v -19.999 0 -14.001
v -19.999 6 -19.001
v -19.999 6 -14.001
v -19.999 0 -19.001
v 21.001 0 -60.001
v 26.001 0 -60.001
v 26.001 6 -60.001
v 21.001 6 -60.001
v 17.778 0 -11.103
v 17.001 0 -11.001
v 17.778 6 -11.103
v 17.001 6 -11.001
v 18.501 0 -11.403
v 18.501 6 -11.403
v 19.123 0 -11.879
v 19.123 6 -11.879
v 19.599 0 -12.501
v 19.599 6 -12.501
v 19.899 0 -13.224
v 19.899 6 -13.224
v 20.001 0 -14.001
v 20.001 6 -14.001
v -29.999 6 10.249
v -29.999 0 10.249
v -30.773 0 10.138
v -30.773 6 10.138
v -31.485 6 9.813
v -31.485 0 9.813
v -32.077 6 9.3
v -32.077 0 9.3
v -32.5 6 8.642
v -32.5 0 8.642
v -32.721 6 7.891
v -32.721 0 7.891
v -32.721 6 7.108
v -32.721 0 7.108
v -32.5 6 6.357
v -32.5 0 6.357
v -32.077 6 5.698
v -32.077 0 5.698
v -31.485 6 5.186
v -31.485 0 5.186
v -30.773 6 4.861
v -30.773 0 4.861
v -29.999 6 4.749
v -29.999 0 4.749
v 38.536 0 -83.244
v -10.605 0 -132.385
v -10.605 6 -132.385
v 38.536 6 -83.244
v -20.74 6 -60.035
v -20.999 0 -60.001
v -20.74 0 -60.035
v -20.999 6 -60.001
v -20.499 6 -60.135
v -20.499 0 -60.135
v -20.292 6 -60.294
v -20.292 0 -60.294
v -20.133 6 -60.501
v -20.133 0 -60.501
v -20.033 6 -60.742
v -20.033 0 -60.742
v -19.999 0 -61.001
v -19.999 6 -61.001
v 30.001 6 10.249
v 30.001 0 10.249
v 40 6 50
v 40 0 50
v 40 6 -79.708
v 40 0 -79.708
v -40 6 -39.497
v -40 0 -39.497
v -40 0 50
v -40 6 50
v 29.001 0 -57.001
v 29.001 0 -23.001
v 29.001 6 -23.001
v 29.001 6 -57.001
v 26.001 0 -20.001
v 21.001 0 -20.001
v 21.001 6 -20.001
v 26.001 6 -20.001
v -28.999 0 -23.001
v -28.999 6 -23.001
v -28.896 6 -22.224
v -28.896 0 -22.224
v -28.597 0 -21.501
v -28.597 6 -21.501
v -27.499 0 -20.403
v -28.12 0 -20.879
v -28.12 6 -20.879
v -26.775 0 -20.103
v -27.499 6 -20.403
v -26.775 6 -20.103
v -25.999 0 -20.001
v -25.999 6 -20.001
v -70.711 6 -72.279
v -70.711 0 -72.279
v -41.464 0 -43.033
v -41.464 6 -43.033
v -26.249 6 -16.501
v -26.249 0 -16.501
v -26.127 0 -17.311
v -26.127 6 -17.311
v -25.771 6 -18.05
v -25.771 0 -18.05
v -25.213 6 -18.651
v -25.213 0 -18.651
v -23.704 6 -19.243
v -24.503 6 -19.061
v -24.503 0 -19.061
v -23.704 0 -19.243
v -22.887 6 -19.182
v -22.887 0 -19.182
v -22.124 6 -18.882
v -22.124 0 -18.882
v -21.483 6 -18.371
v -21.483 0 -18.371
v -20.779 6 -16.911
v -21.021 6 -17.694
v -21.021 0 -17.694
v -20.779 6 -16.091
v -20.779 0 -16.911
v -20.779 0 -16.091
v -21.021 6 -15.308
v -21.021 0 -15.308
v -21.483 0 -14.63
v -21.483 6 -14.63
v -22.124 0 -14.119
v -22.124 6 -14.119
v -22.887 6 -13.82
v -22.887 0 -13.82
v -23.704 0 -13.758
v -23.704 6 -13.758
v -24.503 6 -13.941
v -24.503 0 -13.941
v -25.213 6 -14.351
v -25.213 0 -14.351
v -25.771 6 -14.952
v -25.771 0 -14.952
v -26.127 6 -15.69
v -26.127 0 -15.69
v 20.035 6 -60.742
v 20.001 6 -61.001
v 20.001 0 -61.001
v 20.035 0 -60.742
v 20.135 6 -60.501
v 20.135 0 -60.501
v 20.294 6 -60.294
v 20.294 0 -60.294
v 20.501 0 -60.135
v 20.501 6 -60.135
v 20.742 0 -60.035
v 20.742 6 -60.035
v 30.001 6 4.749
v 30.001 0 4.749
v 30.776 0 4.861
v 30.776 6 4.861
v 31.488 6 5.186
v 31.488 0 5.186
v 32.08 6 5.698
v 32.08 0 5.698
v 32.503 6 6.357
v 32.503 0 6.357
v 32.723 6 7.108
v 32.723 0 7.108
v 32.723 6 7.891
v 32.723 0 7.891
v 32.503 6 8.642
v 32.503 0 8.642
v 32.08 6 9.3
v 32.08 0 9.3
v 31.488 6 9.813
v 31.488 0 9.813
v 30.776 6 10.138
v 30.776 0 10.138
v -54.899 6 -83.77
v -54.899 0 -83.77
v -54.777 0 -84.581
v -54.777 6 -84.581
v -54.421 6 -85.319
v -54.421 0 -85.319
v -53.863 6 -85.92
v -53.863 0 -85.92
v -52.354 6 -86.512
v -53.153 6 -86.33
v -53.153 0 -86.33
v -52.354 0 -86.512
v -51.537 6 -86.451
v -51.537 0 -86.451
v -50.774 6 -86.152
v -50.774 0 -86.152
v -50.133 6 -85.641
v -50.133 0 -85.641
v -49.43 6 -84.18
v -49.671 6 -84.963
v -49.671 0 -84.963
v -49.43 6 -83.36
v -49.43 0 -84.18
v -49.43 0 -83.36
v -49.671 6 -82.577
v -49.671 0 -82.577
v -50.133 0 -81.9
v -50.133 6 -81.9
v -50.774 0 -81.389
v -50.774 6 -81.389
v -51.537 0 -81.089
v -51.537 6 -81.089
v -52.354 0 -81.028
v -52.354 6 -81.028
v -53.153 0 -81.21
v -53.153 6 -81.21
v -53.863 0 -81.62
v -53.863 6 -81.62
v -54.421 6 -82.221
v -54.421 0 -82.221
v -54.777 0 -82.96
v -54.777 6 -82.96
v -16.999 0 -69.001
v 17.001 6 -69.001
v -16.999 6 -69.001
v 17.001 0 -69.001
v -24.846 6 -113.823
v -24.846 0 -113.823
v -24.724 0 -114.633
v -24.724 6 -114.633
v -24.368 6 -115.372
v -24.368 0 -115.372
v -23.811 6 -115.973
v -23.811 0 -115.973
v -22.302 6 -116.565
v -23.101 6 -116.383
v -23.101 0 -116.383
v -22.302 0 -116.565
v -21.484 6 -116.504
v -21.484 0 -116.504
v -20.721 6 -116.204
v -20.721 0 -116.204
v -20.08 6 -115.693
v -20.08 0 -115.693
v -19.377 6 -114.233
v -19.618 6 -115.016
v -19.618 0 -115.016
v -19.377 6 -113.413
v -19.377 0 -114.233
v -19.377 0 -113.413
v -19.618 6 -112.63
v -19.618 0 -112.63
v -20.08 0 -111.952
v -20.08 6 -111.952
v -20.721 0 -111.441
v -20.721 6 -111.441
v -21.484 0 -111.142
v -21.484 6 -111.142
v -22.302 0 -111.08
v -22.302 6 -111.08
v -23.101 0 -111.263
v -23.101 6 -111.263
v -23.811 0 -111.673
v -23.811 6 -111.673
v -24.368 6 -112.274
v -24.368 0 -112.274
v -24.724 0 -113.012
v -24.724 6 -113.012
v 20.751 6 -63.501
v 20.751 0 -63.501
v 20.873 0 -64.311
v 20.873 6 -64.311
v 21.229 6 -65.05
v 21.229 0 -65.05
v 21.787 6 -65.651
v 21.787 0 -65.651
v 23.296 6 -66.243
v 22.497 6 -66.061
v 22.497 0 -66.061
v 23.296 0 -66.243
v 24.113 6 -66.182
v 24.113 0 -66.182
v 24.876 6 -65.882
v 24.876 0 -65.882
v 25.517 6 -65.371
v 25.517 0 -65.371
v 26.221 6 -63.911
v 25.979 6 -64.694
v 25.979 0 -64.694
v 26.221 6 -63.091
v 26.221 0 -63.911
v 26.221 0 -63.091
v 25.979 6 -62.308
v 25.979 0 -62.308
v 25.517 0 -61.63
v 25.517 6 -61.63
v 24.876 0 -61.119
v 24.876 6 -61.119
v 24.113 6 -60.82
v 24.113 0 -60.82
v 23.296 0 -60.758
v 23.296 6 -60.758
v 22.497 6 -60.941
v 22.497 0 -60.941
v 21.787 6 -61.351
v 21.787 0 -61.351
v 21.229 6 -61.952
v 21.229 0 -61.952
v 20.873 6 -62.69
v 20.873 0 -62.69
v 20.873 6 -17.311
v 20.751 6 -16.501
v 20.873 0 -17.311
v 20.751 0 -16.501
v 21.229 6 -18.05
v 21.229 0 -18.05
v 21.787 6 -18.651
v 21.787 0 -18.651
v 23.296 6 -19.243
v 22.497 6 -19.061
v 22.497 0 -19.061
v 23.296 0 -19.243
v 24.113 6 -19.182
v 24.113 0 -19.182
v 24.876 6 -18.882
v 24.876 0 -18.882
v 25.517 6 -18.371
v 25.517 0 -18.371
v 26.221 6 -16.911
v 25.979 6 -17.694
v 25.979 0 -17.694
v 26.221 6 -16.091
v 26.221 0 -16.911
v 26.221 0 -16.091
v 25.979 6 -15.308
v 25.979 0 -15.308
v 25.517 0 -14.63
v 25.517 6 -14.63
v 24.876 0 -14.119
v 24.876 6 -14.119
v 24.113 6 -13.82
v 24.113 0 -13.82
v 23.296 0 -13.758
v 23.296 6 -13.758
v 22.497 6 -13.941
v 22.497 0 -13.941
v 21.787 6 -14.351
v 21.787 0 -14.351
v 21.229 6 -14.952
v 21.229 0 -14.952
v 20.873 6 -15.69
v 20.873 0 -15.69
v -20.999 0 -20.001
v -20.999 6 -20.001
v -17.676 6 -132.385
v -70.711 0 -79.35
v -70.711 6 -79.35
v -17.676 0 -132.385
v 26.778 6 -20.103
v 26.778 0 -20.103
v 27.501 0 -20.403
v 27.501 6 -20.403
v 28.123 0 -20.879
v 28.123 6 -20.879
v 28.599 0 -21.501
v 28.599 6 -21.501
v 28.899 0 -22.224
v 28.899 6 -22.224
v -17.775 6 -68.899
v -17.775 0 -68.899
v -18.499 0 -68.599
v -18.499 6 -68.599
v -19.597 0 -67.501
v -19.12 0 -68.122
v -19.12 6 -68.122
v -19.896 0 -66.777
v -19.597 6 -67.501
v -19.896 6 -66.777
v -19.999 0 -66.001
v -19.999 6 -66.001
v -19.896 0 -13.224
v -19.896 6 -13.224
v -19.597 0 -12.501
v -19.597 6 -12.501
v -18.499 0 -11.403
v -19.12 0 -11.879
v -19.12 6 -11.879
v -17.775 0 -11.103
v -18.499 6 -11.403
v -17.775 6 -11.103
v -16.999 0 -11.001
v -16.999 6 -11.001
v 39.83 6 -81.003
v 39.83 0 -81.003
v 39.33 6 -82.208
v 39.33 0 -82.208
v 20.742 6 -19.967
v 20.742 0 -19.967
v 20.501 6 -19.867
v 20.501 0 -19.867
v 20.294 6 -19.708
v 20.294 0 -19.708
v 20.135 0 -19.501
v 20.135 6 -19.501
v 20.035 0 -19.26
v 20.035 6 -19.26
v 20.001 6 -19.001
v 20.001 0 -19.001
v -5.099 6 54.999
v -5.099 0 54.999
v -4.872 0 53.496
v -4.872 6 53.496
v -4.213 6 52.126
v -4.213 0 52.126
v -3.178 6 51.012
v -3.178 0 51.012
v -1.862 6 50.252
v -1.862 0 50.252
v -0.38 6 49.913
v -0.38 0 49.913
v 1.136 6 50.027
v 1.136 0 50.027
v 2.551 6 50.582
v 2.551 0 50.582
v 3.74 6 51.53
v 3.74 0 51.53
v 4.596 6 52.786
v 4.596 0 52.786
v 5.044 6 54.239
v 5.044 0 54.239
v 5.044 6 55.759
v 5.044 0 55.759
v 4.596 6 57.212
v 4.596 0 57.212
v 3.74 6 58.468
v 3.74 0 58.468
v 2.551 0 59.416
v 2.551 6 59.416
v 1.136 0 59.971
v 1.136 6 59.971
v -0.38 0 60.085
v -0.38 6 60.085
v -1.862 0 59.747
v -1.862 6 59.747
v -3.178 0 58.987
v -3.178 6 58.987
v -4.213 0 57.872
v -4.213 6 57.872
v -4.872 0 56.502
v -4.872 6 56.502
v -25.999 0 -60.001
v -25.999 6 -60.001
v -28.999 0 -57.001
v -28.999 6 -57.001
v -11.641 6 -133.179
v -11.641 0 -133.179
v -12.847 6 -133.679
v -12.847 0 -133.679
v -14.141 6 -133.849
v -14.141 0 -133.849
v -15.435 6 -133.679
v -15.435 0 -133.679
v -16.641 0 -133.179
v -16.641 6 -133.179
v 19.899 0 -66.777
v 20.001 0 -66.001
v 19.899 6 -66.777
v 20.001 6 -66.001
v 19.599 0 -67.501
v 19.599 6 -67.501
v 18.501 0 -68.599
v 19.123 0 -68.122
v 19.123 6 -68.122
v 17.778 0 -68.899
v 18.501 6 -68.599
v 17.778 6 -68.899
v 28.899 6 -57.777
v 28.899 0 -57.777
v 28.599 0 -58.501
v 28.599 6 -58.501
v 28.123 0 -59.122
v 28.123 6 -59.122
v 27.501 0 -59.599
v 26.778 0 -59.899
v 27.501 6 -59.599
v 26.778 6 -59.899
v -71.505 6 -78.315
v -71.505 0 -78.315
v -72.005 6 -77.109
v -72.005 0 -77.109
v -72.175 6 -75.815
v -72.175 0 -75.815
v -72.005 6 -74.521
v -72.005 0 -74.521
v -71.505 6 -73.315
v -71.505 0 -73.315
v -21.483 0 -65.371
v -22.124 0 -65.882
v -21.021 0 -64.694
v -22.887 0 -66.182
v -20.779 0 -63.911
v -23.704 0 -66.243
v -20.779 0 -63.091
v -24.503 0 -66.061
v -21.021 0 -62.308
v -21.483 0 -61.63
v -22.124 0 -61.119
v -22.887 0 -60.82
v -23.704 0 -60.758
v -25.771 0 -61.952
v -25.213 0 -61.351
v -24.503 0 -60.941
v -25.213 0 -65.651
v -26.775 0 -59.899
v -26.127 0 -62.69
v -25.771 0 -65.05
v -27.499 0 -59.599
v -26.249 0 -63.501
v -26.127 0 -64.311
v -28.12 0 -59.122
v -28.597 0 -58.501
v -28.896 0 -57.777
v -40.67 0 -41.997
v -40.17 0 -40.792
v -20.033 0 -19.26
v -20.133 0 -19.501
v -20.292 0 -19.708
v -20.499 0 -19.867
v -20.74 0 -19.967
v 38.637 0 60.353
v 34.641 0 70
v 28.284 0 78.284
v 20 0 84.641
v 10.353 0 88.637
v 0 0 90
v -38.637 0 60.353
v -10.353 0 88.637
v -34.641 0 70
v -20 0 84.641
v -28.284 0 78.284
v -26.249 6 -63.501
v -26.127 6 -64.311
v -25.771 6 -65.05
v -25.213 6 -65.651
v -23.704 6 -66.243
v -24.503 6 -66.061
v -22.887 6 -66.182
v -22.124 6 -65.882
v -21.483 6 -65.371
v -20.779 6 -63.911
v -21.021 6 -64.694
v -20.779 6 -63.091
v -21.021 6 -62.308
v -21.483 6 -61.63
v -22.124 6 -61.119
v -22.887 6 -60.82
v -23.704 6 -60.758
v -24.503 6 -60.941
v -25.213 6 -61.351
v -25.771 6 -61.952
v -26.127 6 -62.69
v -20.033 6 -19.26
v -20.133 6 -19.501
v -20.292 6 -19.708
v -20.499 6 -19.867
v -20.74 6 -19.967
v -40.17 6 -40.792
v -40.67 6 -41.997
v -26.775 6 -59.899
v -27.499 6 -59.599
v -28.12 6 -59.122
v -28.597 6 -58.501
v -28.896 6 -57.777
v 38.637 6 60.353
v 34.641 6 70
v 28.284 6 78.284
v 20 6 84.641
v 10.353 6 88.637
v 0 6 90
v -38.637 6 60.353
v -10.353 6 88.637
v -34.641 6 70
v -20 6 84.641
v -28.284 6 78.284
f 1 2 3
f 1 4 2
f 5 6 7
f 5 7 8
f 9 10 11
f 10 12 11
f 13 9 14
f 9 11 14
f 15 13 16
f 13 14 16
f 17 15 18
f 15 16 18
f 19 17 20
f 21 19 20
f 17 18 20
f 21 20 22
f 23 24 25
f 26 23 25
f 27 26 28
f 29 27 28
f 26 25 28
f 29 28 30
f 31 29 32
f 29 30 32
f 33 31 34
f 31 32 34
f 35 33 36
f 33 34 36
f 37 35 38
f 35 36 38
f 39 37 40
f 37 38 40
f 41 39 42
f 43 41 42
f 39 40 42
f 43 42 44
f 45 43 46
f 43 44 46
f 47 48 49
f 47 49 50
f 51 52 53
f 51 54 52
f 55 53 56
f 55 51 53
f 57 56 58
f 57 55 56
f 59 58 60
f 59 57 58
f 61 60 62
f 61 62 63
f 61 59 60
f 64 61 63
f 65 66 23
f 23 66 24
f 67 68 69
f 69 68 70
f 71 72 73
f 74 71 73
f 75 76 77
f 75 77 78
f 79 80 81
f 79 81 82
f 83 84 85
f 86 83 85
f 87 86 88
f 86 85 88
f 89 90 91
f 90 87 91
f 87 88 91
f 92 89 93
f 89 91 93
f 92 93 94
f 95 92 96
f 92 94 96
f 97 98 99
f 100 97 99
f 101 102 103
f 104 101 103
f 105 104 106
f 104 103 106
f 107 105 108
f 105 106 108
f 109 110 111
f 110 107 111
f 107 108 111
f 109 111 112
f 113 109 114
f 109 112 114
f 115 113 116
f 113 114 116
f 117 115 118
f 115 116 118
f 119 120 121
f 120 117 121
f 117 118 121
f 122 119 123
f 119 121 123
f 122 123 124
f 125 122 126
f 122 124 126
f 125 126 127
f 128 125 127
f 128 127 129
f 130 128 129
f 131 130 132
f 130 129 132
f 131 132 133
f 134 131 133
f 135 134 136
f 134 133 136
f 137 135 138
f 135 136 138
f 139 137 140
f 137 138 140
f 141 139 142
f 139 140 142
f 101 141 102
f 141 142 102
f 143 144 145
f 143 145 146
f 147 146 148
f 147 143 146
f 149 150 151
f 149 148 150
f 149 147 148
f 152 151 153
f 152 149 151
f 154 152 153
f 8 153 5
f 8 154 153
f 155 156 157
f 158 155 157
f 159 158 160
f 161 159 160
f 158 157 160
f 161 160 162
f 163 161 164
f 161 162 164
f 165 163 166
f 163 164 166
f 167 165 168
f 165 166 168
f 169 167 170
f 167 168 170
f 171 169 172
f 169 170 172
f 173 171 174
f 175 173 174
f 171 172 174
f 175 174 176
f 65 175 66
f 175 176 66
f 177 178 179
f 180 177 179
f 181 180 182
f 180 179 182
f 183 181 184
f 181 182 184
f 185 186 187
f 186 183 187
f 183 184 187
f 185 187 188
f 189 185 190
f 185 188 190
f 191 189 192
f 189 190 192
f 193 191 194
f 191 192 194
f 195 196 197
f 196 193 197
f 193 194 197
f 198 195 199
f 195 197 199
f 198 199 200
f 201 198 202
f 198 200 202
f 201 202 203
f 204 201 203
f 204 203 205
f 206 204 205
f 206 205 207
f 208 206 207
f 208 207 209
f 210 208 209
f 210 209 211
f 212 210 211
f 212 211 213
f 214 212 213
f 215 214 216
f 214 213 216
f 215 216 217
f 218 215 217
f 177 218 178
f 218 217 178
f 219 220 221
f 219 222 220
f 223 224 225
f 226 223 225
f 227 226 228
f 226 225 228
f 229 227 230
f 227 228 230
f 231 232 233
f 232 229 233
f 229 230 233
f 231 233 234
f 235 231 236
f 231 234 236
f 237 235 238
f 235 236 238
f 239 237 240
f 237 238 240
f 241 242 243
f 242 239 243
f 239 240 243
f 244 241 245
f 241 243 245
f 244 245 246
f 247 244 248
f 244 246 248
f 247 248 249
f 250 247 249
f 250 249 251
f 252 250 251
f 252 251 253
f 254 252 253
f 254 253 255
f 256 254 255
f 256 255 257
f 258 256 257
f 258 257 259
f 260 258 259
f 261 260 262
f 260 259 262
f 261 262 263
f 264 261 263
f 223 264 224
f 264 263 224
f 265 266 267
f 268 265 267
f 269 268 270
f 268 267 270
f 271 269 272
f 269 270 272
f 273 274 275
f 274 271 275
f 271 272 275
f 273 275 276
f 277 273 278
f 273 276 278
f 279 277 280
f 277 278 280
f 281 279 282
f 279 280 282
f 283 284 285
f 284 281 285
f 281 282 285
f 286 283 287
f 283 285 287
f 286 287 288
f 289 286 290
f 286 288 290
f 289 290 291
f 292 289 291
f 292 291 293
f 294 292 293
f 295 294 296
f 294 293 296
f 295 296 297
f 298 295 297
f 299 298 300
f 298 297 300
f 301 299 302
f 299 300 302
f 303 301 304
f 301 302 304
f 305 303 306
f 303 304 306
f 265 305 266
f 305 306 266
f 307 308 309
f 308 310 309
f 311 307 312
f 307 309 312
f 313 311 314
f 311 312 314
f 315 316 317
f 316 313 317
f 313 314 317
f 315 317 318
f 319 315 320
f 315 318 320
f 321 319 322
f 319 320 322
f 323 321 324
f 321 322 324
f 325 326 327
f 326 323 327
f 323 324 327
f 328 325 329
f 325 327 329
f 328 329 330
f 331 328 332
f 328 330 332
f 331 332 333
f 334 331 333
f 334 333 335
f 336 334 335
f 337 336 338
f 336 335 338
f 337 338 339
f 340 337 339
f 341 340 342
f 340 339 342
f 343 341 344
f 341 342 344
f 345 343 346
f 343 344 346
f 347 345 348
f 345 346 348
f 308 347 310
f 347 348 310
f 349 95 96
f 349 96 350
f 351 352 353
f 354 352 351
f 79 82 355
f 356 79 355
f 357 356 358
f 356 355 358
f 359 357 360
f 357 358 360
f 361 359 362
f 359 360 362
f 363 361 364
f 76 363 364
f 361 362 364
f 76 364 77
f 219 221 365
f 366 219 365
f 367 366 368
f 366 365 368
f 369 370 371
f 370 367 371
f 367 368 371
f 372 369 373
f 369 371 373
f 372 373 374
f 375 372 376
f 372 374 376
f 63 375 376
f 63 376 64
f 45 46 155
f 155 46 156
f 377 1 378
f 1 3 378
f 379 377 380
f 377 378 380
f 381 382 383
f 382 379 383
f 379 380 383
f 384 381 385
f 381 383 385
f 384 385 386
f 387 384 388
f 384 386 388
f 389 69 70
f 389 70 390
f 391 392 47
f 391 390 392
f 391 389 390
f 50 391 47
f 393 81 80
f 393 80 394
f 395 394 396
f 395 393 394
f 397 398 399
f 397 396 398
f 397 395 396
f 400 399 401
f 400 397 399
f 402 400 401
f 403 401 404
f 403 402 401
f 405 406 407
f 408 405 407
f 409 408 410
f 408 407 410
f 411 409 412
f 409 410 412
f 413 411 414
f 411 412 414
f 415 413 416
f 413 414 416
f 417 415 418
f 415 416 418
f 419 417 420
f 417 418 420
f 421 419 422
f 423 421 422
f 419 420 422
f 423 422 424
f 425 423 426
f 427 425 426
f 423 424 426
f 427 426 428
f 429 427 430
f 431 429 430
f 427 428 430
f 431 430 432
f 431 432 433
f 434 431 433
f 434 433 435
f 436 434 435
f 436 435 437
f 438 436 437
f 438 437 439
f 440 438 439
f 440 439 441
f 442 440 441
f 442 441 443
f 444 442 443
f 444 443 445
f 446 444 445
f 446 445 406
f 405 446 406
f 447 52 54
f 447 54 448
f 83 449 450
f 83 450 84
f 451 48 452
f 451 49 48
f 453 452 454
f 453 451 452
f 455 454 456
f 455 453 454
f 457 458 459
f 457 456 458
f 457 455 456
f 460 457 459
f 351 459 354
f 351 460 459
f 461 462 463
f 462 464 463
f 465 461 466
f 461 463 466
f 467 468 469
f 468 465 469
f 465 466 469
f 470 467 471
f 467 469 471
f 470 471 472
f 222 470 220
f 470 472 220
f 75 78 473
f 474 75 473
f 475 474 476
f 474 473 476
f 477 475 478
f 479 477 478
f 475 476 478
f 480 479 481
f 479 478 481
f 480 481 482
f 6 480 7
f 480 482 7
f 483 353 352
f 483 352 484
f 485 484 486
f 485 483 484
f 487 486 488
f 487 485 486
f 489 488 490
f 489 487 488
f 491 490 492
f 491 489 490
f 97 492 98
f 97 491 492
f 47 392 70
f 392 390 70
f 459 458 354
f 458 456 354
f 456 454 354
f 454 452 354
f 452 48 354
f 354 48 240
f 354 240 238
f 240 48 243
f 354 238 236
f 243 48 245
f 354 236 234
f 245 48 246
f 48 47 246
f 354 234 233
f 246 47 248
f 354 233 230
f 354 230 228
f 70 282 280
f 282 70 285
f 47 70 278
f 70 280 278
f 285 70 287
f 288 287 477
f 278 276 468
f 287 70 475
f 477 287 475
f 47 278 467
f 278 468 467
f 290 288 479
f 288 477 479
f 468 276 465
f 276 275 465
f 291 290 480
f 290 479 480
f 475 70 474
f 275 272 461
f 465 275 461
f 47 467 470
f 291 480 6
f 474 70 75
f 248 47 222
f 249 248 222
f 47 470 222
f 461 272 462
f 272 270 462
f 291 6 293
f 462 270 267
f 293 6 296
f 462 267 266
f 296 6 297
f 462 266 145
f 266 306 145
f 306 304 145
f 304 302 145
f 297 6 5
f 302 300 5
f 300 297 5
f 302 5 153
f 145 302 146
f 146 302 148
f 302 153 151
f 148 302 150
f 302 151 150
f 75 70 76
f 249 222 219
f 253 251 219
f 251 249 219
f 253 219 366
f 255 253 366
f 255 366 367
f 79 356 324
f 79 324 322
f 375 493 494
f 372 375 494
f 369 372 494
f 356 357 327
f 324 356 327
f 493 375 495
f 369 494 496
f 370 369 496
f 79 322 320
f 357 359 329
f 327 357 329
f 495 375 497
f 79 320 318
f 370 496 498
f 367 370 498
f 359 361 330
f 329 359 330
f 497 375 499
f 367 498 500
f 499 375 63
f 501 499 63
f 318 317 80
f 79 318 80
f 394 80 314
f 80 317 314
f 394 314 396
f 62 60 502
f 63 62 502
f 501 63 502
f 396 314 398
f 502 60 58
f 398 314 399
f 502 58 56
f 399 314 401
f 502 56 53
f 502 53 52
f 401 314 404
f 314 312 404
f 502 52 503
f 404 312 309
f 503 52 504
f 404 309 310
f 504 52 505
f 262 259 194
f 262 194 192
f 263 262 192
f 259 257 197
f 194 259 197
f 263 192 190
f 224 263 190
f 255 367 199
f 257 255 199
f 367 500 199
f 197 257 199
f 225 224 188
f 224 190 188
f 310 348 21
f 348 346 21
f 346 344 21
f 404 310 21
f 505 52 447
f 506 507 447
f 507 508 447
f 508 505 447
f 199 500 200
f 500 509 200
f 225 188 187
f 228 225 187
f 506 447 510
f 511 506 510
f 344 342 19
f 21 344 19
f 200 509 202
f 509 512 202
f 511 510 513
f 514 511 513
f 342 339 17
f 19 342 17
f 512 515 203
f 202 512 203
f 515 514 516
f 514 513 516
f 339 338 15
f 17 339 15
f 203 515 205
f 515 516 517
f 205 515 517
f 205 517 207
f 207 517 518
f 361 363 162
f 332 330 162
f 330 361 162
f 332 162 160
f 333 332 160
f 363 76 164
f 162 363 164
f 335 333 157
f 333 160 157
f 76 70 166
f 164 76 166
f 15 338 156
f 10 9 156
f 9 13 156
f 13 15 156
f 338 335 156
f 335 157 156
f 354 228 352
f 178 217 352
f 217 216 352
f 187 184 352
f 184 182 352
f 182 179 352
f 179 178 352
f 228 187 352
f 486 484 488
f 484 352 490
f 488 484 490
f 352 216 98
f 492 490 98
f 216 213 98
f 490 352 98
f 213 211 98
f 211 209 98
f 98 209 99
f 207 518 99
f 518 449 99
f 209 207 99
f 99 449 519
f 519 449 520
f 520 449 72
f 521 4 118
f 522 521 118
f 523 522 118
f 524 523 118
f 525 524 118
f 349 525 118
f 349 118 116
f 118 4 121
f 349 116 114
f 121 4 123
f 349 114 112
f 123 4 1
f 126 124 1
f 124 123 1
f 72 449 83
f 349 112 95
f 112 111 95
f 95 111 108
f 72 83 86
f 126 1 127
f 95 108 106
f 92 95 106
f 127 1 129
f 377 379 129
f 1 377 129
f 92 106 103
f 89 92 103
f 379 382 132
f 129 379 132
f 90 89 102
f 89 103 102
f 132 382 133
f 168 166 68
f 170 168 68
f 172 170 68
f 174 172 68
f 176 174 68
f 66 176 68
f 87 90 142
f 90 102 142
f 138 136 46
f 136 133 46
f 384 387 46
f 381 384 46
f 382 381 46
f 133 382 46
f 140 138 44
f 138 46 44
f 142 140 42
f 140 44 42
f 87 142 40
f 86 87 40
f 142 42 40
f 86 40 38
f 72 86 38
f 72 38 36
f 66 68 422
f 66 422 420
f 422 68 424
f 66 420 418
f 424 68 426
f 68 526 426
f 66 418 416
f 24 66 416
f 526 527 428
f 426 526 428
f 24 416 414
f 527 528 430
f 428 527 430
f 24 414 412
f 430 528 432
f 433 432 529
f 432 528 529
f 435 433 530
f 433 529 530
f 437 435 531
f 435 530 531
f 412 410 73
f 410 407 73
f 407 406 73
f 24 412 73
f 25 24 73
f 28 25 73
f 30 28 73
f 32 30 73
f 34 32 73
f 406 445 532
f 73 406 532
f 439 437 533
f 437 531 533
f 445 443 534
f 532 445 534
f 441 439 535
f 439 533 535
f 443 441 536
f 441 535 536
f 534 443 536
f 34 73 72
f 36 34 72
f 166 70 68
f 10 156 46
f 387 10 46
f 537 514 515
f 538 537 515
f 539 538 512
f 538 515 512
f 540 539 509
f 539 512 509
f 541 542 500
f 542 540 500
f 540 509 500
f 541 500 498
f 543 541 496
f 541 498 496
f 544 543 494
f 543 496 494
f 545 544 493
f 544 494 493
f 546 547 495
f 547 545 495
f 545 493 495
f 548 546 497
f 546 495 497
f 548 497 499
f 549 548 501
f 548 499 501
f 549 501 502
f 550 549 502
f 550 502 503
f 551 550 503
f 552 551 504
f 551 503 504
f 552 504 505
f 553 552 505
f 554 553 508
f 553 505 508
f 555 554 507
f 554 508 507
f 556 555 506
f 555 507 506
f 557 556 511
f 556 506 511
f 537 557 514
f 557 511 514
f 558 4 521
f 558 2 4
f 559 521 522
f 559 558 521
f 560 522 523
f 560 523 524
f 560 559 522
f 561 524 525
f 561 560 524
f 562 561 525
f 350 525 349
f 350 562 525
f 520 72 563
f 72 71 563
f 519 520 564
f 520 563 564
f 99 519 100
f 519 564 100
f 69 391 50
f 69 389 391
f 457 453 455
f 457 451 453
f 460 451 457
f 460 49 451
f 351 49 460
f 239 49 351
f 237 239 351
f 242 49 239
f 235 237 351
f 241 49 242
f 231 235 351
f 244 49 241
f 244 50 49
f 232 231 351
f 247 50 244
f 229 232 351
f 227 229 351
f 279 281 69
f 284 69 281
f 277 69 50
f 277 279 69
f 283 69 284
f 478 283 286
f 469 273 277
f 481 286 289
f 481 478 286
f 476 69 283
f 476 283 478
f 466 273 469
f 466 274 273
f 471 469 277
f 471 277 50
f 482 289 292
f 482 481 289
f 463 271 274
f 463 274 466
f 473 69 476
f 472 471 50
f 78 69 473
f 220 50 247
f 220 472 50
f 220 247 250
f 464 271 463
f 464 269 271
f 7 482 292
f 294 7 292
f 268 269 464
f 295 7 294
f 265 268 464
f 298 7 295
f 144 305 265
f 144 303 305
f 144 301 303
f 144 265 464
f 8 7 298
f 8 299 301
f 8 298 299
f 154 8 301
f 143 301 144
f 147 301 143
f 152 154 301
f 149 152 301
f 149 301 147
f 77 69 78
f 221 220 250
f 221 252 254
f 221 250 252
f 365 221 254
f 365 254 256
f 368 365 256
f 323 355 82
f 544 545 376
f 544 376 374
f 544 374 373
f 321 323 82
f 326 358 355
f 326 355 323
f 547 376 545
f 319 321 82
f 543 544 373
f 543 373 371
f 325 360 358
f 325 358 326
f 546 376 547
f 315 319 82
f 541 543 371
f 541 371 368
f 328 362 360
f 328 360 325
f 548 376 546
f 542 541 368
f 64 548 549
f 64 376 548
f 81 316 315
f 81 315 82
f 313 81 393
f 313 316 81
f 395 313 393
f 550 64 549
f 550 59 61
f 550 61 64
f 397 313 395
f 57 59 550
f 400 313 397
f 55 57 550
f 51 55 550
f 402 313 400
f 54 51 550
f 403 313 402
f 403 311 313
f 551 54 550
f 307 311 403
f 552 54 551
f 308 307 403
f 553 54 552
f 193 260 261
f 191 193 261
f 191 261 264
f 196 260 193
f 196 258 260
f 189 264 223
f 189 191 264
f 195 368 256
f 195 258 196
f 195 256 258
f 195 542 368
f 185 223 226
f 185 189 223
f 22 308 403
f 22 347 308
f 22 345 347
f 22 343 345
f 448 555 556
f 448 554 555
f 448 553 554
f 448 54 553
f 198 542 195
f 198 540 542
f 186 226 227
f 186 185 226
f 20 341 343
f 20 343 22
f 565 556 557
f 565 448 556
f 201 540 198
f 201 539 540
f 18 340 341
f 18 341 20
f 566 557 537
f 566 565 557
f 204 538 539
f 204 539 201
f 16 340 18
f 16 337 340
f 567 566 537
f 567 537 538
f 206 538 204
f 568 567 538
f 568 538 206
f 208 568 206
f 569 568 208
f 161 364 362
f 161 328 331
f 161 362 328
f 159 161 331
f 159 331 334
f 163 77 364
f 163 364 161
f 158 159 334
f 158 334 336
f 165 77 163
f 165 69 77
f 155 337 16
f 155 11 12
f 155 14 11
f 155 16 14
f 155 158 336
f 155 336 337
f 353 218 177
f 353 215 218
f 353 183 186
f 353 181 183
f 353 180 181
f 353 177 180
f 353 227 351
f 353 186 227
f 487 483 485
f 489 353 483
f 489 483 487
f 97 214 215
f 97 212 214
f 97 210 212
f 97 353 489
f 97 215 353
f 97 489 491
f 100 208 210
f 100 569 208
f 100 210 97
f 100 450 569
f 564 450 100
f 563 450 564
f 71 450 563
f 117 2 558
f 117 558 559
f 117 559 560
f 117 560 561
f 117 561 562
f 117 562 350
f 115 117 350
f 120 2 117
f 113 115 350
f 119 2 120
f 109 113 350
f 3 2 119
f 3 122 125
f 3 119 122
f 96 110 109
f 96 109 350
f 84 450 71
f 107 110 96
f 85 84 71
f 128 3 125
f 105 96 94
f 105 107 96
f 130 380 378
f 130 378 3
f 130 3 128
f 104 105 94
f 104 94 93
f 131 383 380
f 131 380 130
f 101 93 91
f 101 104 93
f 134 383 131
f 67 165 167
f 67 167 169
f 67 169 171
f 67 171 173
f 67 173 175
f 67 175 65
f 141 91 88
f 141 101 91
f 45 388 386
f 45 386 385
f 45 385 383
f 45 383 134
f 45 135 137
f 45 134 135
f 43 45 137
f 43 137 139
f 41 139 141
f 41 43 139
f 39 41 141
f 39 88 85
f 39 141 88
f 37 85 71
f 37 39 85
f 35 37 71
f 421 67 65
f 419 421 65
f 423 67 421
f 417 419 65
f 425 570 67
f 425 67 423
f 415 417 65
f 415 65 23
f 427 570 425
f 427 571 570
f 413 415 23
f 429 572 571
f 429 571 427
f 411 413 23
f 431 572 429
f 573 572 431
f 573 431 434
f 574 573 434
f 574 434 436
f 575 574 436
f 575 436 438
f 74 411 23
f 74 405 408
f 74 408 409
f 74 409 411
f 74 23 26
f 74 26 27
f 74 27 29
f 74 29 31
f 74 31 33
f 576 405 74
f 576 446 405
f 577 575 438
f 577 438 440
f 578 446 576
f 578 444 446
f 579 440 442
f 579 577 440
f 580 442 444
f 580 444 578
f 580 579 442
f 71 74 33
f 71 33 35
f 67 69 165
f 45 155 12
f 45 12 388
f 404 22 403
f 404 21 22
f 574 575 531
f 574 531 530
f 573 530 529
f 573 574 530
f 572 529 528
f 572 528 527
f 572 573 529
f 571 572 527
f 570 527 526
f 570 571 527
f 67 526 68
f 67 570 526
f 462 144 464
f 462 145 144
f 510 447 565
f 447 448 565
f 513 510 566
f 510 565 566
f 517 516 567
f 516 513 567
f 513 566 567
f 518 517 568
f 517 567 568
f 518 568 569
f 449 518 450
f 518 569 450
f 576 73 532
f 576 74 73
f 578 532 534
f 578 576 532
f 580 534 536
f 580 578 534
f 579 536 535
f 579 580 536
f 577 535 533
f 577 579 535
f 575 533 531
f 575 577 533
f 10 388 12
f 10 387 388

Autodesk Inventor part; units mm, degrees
ref_plane "YZ Plane" through (0, 0, 0) normal (1, 0, 0) x (0, 1, 0)
ref_plane "XZ Plane" through (0, 0, 0) normal (0, 1, 0) x (-1, 0, 0)
sketch "Sketch1" plane through (0, 0, 0) normal (0, 1, 0) x (-1, 0, 0)
  line L0 (40, 90) -> (-40, 90)
  line L1 (-40, 90) -> (-40, -81.7795)
  line L2 (40, -41.5685) -> (40, 90)
  line L3 (40, 90) -> (-40, -90) construction
  line L4 (-40, 90) -> (40, -90) construction
  circle A0 centre (-0.0013, 54.9992) radius 5.1
  line L5 (23.4987, -16.5008) -> (-23.5013, -16.5008) construction
  line L6 (-23.5013, -16.5008) -> (-23.5013, -63.5008) construction
  line L7 (-23.5013, -63.5008) -> (23.4987, -63.5008) construction
  line L8 (23.4987, -63.5008) -> (23.4987, -16.5008) construction
  line L9 (23.4987, -16.5008) -> (-23.5013, -63.5008) construction
  line L10 (-23.5013, -16.5008) -> (23.4987, -63.5008) construction
  circle A1 centre (23.4987, -16.5008) radius 2.75
  circle A2 centre (23.4987, -63.5008) radius 2.75
  circle A3 centre (-23.5013, -16.5008) radius 2.75
  circle A4 centre (-23.5013, -63.5008) radius 2.75
  line L11 (-0.0013, -90.0008) -> (-0.0013, -80) construction
  line L12 (19.9987, -11.0008) -> (-20.0013, -11.0008)
  line L13 (-20.0013, -11.0008) -> (-20.0013, -69.0008)
  line L14 (-20.0013, -69.0008) -> (19.9987, -69.0008)
  line L15 (19.9987, -69.0008) -> (19.9987, -11.0008)
  line L16 (19.9987, -11.0008) -> (-20.0013, -69.0008) construction
  line L17 (-20.0013, -11.0008) -> (19.9987, -69.0008) construction
  line L18 (-29.0013, -60.0008) -> (28.9987, -60.0008)
  line L19 (28.9987, -60.0008) -> (28.9987, -20.0008)
  line L20 (28.9987, -20.0008) -> (-29.0013, -20.0008)
  line L21 (-29.0013, -20.0008) -> (-29.0013, -60.0008)
  line L22 (-29.0013, -60.0008) -> (28.9987, -20.0008) construction
  line L23 (28.9987, -60.0008) -> (-29.0013, -20.0008) construction
  line L24 (-0.0013, 54.9992) -> (102.5291, -47.5313) construction
  line L25 (-0.0013, 54.9992) -> (144.9987, 54.9992) construction
  line L26 (28.2843, 83.2843) -> (-28.2843, 26.7157) construction
  line L27 (-28.2843, 26.7157) -> (74.2462, -75.8148) construction
  line L28 (74.2462, -75.8148) -> (130.8148, -19.2462) construction
  line L29 (130.8148, -19.2462) -> (28.2843, 83.2843) construction
  line L30 (28.2843, 83.2843) -> (74.2462, -75.8148) construction
  line L31 (-28.2843, 26.7157) -> (130.8148, -19.2462) construction
  line L32 (74.2462, -75.8148) -> (14.1407, -135.9202)
  line L33 (14.1407, -135.9202) -> (-0.0014, -121.7781)
  line L34 (-0.0014, -121.7781) -> (-31.7795, -90)
  line L35 (74.2462, -75.8148) -> (40, -41.5685)
  line L36 (-31.7795, -90) -> (-40, -81.7795)
  line L37 (44.1935, -105.8675) -> (37.1224, -98.7964)
  line L38 (37.1224, -98.7964) -> (52.1488, -83.7701) construction
  line L39 (37.1224, -98.7964) -> (22.096, -113.8228) construction
  circle A5 centre (52.1488, -83.7701) radius 2.75
  circle A6 centre (22.096, -113.8228) radius 2.75
  line L40 (-0.0013, 54.9992) -> (-0.0013, -40.0008)
  point P0 (0, 0)
  point P1 (51.2639, 3.7339)
  point P2 (-0.0013, -40.0008)
  dimension "d0" = 80
  dimension "d1" = 180
  dimension "d3" = 10.2
  dimension "d5" = 47
  dimension "d6" = 47
  dimension "d7" = 5.5
  dimension "d8" = 5.5
  dimension "d9" = 5.5
  dimension "d10" = 5.5
  dimension "d12" = 40
  dimension "d13" = 58
  dimension "d14" = 58
  dimension "d15" = 40
  dimension "d27" = 45
  dimension "d28" = 145
  dimension "d29" = 80
  dimension "d30" = 145
  dimension "d31" = 85.002
  dimension "d32" = 20
  dimension "d33" = 10
  dimension "d35" = 21.2505
  dimension "d36" = 21.2505
  dimension "d37" = 5.5
  dimension "d38" = 5.5
  dimension "d53" = 95
extrude "Plate3" add sketch "Sketch1" along normal blind 6
fillet "Fillet6" radius 5 4 edges at (-40, 3, -41.5685) (-74.2462, 3, -75.8148) (-14.1407, 3, -135.9202) (40, 3, -81.7795)
fillet "Fillet7" radius 40 2 edges at (40, 3, 90) (-40, 3, 90)
sketch "Sketch2" plane through (0, 0, 0) normal (0, -1, 0) x (1, 0, 0)
  circle A0 centre (0.0013, 54.9992) radius 5.1 projected
  line L0 (0.0013, 54.9992) -> (0.0013, -40.0008) construction
  line L1 (0.0013, 7.4992) -> (55.0013, 7.4992) construction
  line L2 (0.0013, 7.4992) -> (-54.9987, 7.4992) construction
  line L3 (-29.9987, 7.4992) -> (30.0013, 7.4992) construction
  line L4 (-29.9987, 4.7492) -> (30.0013, 4.7492)
  line L5 (30.0013, 10.2492) -> (-29.9987, 10.2492)
  arc A1 (-29.9987, 10.2492) -> (-29.9987, 4.7492) centre (-29.9987, 7.4992) ccw
  arc A2 (30.0013, 4.7492) -> (30.0013, 10.2492) centre (30.0013, 7.4992) ccw
  point P0 (0, 0)
  dimension "d43" = 95
  dimension "d44" = 55
  dimension "d45" = 55
  dimension "d46" = 30
  dimension "d47" = 5.5
extrude "Extrusion1" cut sketch "Sketch2" against normal blind 10 contours A1 L5 A2 L4
fillet "Fillet9" radius 3 8 edges at (20.0013, 3, -11.0008) (29.0013, 3, -20.0008) (-28.9987, 3, -20.0008) (-19.9987, 3, -11.0008) (29.0013, 3, -60.0008) (20.0013, 3, -69.0008) (-28.9987, 3, -60.0008) (-19.9987, 3, -69.0008)
fillet "Fillet10" radius 1 4 edges at (-19.9987, 3, -20.0008) (20.0013, 3, -20.0008) (20.0013, 3, -60.0008) (-19.9987, 3, -60.0008)
ref_plane "Work Plane1" through (-29.9987, 0, 7.4992) normal (0, 0, 1) x (1, 0, 0)
equation "\"d39\" = Thickness"
equation "\"BendRadius\" = Thickness"
equation "\"BendReliefWidth\" = Thickness"
equation "\"BendReliefDepth\" = 0.5 * Thickness"
equation "\"CornerReliefSize\" = 4 * Thickness"
equation "\"MinimumRemnant\" = 2 * Thickness"
equation "\"TransitionRadius\" = BendRadius"
equation "\"JacobiRadiusSize\" = BendRadius"
equation "\"GapSize\" = Thickness"
equation "\"Thickness\" = 6"
properties part number "NEMA23MountPlatev2" material "Aluminum 6061"
